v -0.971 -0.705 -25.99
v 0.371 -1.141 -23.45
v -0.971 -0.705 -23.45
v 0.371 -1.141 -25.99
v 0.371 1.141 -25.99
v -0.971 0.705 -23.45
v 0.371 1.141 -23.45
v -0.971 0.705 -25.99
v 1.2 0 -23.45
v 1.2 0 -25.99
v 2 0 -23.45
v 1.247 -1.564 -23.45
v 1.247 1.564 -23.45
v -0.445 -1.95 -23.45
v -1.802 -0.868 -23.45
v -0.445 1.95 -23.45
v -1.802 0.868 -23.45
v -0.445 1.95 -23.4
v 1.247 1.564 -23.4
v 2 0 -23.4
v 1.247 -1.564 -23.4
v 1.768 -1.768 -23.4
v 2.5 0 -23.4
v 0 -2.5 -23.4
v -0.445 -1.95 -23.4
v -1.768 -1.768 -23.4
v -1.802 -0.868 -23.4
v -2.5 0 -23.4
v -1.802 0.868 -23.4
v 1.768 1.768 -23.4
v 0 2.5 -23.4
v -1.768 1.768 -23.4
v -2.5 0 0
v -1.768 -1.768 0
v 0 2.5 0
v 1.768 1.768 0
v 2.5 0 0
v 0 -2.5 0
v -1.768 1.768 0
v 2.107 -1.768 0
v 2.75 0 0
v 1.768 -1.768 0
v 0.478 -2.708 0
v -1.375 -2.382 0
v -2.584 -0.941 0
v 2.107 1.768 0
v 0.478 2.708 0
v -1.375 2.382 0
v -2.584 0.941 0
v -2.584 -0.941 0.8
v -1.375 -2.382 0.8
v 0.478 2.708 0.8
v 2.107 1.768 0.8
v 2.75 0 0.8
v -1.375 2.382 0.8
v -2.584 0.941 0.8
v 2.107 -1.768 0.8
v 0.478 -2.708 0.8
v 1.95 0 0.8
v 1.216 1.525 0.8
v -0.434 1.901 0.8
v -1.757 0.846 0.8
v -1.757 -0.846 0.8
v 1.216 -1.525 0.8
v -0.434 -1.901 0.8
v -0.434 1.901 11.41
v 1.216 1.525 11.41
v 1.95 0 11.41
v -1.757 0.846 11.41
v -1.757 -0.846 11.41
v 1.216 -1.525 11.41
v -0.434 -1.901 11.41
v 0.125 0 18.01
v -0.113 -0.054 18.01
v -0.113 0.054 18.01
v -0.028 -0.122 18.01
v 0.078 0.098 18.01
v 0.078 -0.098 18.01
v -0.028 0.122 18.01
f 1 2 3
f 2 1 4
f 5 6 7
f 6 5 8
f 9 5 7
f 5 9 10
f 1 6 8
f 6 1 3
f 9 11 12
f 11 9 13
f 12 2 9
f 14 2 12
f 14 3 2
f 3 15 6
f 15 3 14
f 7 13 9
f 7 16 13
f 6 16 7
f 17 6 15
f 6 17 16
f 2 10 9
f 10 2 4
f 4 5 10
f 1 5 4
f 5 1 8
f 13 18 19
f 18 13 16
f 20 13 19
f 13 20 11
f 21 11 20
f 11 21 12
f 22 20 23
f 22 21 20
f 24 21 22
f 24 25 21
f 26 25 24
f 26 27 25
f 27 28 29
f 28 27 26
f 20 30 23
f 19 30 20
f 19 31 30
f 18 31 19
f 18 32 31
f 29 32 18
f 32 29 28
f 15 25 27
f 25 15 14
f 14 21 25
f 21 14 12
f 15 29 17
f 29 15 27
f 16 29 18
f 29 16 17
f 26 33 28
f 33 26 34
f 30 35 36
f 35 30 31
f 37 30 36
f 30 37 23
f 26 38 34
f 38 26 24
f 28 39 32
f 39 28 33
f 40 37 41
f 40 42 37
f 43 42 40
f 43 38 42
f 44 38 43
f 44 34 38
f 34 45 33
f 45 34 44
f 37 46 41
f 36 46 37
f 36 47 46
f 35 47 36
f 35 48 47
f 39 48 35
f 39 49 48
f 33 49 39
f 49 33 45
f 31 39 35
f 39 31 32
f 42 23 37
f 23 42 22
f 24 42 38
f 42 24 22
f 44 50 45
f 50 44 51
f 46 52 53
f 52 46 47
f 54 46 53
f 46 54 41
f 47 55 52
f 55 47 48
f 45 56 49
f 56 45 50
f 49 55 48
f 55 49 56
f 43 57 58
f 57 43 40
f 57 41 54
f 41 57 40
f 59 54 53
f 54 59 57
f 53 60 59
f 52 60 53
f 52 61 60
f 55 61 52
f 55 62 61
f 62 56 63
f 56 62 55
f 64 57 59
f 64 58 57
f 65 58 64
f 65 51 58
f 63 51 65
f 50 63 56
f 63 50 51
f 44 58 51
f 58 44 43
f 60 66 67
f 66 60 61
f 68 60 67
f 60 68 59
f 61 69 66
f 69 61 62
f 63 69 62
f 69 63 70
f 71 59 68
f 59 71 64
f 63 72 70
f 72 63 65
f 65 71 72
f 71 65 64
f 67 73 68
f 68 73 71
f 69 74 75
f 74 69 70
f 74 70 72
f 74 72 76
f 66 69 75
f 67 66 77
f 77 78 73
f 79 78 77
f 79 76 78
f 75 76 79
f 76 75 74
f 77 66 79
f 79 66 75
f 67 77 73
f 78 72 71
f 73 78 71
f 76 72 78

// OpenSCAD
// file: GP-xL.scad
/* [Options] */
body_lip_diameter = 5.5;
body_diameter = 5;
lower_shaft_diameter = 2.4;
head_diameter = 5.5;
head_length = 6.6;
upper_shaft_diameter = 3.9;
total_length = 44;
body_lip_height = 0.8;
body_length = 23.4;
compression = 0;
retaining_disk_location_from_bottom = 2.54;
retaining_disk_height = 0.05;
retaining_disk_diameter = 4;
head_tip_diameter = 0.25;

module make_GP_xL(body_lip_diameter = body_lip_diameter,
body_diameter = body_diameter,
lower_shaft_diameter = lower_shaft_diameter,
head_diameter = head_diameter,
head_length = head_length,
upper_shaft_diameter = upper_shaft_diameter,
total_length = total_length,
body_lip_height = body_lip_height,
body_length = body_length,
compression = compression,
retaining_disk_location_from_bottom = retaining_disk_location_from_bottom,
retaining_disk_height = retaining_disk_height,
retaining_disk_diameter = retaining_disk_diameter,
head_tip_diameter = head_tip_diameter) {
    /*
    Bottom Shaft
    Retaining Ring
    Continuing Bottom Shaft
    Body
    Body Lip
    Upper Shaft
    Cone
    Compression
    */
    bottom_shaft_length = compression;
    upper_shaft_length = total_length-(retaining_disk_location_from_bottom+retaining_disk_height+bottom_shaft_length+body_length+body_lip_height+head_length);
    
    alignment_position = retaining_disk_location_from_bottom+retaining_disk_height+bottom_shaft_length+body_length;
    translate([0, 0, -alignment_position]) {
    translate([0,0,retaining_disk_location_from_bottom/2])cylinder(d=lower_shaft_diameter, h=retaining_disk_location_from_bottom, center=true);

    translate([0,0,retaining_disk_location_from_bottom])cylinder(d=retaining_disk_diameter, h=retaining_disk_height, center=false);

    translate([0,0,retaining_disk_location_from_bottom+retaining_disk_height])cylinder(d=lower_shaft_diameter, h=bottom_shaft_length);
    
    let(z=retaining_disk_location_from_bottom+retaining_disk_height+bottom_shaft_length) {
        translate([0,0,z])cylinder(d=body_diameter, h=body_length);
    };
    
    
    let(z=retaining_disk_location_from_bottom+retaining_disk_height+bottom_shaft_length+body_length) {
        translate([0,0,z])cylinder(d=body_lip_diameter, h=body_lip_height);
    };
    
    let(z=retaining_disk_location_from_bottom+retaining_disk_height+bottom_shaft_length+body_length+body_lip_height) {
        translate([0,0,z])cylinder(d=upper_shaft_diameter, h=upper_shaft_length);
    };
    
    let(z=retaining_disk_location_from_bottom+retaining_disk_height+bottom_shaft_length+body_length+body_lip_height+upper_shaft_length) {
        translate([0,0,z])cylinder(d1=head_diameter, d2=head_tip_diameter, h=head_length);
    };
};
}


make_GP_xL();
// main file
/* [Options] */
body_lip_diameter = 5.5;
body_diameter = 5;
lower_shaft_diameter = 2.4;
upper_shaft_diameter = 3.9;
head_length = 6.6;
head_diameter = upper_shaft_diameter;
total_length = 44;
body_lip_height = 0.8;
body_length = 23.4;
compression = 0;
retaining_disk_location_from_bottom = 2.54;
retaining_disk_height = 0.05;
retaining_disk_diameter = 4;
head_tip_diameter = 0.25;

use<GP-xL.scad>

module make_GP_2S(body_lip_diameter = body_lip_diameter,
body_diameter = body_diameter,
lower_shaft_diameter = lower_shaft_diameter,
head_length = head_length,
upper_shaft_diameter = upper_shaft_diameter,
total_length = total_length,
body_lip_height = body_lip_height,
body_length = body_length,
compression = compression,
retaining_disk_location_from_bottom = retaining_disk_location_from_bottom,
retaining_disk_height = retaining_disk_height,
retaining_disk_diameter = retaining_disk_diameter,
head_tip_diameter = head_tip_diameter) {

    head_diameter = upper_shaft_diameter;
    
    make_GP_xL(body_lip_diameter = body_lip_diameter,
body_diameter = body_diameter,
lower_shaft_diameter = lower_shaft_diameter,
head_diameter = head_diameter,
head_length = head_length,
upper_shaft_diameter = upper_shaft_diameter,
total_length = total_length,
body_lip_height = body_lip_height,
body_length = body_length,
compression = compression,
retaining_disk_location_from_bottom = retaining_disk_location_from_bottom,
retaining_disk_height = retaining_disk_height,
retaining_disk_diameter = retaining_disk_diameter,
head_tip_diameter = head_tip_diameter);
}

function get_GP_2S_hole_dimensions() = [[body_lip_diameter, body_lip_height], [body_diameter, body_length]];

make_GP_2S(head_length=head_length, total_length=44, body_length=body_length);
